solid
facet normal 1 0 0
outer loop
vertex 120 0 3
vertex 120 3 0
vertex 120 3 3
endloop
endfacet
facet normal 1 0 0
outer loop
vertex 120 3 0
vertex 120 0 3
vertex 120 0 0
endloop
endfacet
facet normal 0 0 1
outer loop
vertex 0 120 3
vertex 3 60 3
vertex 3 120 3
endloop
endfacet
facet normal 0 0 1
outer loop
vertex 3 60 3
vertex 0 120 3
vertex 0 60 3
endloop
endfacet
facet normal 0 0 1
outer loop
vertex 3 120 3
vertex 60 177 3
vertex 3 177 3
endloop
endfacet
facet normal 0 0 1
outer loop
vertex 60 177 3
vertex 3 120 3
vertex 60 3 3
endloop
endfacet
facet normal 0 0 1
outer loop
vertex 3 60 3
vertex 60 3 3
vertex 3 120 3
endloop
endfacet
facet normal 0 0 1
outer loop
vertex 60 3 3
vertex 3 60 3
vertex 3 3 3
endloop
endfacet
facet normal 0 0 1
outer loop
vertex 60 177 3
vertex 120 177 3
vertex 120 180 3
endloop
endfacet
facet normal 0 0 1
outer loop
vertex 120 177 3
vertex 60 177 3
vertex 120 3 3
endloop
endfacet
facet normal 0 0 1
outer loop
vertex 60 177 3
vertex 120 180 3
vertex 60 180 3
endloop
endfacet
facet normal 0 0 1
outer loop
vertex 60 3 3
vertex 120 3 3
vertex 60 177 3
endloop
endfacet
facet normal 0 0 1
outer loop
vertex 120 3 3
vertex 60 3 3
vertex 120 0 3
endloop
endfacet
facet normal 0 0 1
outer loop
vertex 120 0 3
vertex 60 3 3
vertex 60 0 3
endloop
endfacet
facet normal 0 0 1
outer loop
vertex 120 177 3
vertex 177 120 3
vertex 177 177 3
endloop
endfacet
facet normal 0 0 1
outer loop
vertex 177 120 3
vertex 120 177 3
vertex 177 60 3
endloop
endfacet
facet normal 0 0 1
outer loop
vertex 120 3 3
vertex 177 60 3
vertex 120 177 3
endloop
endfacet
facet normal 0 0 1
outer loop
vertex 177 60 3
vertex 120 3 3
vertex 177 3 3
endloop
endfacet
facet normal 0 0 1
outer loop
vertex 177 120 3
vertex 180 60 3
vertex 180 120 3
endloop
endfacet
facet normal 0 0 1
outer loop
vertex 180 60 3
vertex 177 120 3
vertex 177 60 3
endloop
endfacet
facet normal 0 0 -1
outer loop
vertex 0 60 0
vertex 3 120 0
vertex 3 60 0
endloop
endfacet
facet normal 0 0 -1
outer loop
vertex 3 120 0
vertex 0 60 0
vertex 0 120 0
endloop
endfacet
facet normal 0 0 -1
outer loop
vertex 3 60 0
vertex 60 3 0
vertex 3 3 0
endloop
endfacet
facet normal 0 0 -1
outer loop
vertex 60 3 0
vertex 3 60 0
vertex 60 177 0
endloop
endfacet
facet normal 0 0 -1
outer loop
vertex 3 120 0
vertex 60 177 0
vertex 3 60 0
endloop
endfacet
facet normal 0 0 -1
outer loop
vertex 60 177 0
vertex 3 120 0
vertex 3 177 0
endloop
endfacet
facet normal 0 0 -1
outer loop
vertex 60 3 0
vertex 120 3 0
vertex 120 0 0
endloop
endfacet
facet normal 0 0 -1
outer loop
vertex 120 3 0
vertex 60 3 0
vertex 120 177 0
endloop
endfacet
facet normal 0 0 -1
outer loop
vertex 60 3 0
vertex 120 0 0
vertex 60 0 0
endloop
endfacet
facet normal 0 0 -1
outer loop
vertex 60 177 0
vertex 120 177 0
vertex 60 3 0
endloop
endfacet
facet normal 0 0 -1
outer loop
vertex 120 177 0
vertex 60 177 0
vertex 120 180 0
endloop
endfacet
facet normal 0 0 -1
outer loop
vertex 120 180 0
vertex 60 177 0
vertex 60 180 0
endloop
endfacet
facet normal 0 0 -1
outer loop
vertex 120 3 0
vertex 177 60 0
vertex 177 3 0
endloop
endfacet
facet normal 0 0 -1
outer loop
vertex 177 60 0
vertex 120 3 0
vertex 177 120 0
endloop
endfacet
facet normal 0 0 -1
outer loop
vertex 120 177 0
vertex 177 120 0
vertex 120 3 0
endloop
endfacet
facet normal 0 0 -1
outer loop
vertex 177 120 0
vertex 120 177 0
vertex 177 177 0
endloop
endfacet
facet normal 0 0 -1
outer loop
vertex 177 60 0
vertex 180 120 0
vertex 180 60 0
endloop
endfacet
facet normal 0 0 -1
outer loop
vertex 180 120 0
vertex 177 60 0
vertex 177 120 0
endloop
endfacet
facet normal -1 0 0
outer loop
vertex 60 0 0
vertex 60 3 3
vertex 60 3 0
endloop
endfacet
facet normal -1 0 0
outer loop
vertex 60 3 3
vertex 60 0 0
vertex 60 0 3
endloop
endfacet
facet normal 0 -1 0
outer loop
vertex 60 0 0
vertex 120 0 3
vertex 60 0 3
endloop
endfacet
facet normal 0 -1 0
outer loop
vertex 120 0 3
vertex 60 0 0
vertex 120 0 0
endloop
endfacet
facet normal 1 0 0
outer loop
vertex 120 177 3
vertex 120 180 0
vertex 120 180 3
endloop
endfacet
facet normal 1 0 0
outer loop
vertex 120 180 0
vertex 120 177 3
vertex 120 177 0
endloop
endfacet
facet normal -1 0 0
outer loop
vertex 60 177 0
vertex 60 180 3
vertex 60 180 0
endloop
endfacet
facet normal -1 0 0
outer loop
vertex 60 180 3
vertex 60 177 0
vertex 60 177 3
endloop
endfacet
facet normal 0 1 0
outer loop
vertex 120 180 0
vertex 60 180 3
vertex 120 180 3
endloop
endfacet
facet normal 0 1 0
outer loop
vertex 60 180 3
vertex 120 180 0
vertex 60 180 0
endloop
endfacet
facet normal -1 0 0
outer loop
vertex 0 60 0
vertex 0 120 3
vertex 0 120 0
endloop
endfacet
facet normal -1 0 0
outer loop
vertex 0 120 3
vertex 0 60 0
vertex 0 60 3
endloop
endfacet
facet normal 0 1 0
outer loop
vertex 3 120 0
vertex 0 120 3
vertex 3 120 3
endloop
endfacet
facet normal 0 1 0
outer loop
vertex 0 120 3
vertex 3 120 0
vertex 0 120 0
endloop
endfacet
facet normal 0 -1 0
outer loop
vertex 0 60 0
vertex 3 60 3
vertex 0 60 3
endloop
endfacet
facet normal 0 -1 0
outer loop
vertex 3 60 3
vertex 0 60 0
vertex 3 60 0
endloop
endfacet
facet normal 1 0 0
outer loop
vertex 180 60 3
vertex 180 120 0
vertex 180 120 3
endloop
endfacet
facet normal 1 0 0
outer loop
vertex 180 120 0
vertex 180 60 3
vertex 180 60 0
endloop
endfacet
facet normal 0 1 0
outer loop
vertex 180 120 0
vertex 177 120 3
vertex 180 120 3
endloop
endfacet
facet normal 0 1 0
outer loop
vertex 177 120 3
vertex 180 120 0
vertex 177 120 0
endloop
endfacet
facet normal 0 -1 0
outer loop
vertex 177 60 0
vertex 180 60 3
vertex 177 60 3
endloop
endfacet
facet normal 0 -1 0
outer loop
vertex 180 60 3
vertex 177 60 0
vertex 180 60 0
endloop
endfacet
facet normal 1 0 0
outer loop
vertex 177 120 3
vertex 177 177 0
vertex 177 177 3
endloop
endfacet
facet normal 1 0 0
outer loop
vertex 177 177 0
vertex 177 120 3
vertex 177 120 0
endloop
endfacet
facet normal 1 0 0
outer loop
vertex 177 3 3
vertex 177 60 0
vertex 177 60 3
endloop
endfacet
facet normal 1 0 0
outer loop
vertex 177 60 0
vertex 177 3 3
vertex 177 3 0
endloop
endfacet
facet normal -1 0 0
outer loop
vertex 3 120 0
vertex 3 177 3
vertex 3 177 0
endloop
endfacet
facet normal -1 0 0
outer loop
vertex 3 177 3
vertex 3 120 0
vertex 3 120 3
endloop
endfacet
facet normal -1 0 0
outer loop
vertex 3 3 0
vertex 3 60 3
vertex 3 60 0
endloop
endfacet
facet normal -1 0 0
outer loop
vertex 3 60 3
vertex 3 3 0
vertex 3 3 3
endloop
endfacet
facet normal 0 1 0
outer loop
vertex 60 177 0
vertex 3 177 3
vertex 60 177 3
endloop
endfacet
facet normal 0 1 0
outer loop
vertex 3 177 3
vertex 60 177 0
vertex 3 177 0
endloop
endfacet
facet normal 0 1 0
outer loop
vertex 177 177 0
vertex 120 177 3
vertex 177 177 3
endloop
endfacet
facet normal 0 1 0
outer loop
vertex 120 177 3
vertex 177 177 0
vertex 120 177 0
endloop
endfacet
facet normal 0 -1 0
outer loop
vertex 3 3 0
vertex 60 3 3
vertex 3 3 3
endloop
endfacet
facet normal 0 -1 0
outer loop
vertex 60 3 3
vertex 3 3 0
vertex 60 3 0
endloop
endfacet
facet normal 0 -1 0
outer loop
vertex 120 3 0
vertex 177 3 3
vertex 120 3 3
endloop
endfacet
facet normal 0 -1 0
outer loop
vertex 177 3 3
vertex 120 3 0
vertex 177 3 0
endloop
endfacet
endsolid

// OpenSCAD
// file: config.scad
// All measures in millimeters

$fn = 200;
material_z = 3;
nothing = 0.01;

box_x = 180;
box_y = box_x;
box_z = 50;

top_inset_z = 3;
bottom_inset_z = 3;

nose_width = box_x / 3;
nose_offset_x = box_x/2 - nose_width/2;
nose_offset_y = nose_offset_x;

/*
 * Pintsch Bamag KNRW-220-G measures
 */
lamp_diameter = 165;
// [hole_x, hole_y hole_diameter]
lamp_holes = [
    // The big one
    [112.352, 93.705, 19],
    // The inner screw holes in counterclockwise order
    [82.735, 141.303, 6],
    [25.113, 51.206, 6],
    [131.988, 46.073, 6],
    // The outer screw holes in counterclockwise order
    [66.192, 142.490, 6],
    [32.613, 36.141, 6],
    [141.364, 59.746, 6]
    ];

lamp_offset_x = (box_x - lamp_diameter)/2;
lamp_offset_y = (box_y - lamp_diameter)/2;
// main file
include <config.scad>;

module box_bottom()
{
    // Central plate
    translate([
        material_z,
        material_z,
        0
        ])
    cube([
        box_x - 2*material_z,
        box_y - 2*material_z,
        material_z
        ]);

    // Add front and back edge noses
    for (y = [
                0,
                box_y - material_z - nothing
            ])
    {
        translate([
            nose_offset_x,
            y,
            0
            ])
        cube([
            nose_width,
            material_z + nothing,
            material_z
            ]);
    }

    // Add left and right edge noses
    for (x = [
            0,
            box_x - material_z - nothing
            ])
    {
        translate([
            x,
            nose_offset_y,
            0
            ])
        cube([
            material_z + nothing,
            nose_width,
            material_z
            ]);
    }
}

box_bottom();
